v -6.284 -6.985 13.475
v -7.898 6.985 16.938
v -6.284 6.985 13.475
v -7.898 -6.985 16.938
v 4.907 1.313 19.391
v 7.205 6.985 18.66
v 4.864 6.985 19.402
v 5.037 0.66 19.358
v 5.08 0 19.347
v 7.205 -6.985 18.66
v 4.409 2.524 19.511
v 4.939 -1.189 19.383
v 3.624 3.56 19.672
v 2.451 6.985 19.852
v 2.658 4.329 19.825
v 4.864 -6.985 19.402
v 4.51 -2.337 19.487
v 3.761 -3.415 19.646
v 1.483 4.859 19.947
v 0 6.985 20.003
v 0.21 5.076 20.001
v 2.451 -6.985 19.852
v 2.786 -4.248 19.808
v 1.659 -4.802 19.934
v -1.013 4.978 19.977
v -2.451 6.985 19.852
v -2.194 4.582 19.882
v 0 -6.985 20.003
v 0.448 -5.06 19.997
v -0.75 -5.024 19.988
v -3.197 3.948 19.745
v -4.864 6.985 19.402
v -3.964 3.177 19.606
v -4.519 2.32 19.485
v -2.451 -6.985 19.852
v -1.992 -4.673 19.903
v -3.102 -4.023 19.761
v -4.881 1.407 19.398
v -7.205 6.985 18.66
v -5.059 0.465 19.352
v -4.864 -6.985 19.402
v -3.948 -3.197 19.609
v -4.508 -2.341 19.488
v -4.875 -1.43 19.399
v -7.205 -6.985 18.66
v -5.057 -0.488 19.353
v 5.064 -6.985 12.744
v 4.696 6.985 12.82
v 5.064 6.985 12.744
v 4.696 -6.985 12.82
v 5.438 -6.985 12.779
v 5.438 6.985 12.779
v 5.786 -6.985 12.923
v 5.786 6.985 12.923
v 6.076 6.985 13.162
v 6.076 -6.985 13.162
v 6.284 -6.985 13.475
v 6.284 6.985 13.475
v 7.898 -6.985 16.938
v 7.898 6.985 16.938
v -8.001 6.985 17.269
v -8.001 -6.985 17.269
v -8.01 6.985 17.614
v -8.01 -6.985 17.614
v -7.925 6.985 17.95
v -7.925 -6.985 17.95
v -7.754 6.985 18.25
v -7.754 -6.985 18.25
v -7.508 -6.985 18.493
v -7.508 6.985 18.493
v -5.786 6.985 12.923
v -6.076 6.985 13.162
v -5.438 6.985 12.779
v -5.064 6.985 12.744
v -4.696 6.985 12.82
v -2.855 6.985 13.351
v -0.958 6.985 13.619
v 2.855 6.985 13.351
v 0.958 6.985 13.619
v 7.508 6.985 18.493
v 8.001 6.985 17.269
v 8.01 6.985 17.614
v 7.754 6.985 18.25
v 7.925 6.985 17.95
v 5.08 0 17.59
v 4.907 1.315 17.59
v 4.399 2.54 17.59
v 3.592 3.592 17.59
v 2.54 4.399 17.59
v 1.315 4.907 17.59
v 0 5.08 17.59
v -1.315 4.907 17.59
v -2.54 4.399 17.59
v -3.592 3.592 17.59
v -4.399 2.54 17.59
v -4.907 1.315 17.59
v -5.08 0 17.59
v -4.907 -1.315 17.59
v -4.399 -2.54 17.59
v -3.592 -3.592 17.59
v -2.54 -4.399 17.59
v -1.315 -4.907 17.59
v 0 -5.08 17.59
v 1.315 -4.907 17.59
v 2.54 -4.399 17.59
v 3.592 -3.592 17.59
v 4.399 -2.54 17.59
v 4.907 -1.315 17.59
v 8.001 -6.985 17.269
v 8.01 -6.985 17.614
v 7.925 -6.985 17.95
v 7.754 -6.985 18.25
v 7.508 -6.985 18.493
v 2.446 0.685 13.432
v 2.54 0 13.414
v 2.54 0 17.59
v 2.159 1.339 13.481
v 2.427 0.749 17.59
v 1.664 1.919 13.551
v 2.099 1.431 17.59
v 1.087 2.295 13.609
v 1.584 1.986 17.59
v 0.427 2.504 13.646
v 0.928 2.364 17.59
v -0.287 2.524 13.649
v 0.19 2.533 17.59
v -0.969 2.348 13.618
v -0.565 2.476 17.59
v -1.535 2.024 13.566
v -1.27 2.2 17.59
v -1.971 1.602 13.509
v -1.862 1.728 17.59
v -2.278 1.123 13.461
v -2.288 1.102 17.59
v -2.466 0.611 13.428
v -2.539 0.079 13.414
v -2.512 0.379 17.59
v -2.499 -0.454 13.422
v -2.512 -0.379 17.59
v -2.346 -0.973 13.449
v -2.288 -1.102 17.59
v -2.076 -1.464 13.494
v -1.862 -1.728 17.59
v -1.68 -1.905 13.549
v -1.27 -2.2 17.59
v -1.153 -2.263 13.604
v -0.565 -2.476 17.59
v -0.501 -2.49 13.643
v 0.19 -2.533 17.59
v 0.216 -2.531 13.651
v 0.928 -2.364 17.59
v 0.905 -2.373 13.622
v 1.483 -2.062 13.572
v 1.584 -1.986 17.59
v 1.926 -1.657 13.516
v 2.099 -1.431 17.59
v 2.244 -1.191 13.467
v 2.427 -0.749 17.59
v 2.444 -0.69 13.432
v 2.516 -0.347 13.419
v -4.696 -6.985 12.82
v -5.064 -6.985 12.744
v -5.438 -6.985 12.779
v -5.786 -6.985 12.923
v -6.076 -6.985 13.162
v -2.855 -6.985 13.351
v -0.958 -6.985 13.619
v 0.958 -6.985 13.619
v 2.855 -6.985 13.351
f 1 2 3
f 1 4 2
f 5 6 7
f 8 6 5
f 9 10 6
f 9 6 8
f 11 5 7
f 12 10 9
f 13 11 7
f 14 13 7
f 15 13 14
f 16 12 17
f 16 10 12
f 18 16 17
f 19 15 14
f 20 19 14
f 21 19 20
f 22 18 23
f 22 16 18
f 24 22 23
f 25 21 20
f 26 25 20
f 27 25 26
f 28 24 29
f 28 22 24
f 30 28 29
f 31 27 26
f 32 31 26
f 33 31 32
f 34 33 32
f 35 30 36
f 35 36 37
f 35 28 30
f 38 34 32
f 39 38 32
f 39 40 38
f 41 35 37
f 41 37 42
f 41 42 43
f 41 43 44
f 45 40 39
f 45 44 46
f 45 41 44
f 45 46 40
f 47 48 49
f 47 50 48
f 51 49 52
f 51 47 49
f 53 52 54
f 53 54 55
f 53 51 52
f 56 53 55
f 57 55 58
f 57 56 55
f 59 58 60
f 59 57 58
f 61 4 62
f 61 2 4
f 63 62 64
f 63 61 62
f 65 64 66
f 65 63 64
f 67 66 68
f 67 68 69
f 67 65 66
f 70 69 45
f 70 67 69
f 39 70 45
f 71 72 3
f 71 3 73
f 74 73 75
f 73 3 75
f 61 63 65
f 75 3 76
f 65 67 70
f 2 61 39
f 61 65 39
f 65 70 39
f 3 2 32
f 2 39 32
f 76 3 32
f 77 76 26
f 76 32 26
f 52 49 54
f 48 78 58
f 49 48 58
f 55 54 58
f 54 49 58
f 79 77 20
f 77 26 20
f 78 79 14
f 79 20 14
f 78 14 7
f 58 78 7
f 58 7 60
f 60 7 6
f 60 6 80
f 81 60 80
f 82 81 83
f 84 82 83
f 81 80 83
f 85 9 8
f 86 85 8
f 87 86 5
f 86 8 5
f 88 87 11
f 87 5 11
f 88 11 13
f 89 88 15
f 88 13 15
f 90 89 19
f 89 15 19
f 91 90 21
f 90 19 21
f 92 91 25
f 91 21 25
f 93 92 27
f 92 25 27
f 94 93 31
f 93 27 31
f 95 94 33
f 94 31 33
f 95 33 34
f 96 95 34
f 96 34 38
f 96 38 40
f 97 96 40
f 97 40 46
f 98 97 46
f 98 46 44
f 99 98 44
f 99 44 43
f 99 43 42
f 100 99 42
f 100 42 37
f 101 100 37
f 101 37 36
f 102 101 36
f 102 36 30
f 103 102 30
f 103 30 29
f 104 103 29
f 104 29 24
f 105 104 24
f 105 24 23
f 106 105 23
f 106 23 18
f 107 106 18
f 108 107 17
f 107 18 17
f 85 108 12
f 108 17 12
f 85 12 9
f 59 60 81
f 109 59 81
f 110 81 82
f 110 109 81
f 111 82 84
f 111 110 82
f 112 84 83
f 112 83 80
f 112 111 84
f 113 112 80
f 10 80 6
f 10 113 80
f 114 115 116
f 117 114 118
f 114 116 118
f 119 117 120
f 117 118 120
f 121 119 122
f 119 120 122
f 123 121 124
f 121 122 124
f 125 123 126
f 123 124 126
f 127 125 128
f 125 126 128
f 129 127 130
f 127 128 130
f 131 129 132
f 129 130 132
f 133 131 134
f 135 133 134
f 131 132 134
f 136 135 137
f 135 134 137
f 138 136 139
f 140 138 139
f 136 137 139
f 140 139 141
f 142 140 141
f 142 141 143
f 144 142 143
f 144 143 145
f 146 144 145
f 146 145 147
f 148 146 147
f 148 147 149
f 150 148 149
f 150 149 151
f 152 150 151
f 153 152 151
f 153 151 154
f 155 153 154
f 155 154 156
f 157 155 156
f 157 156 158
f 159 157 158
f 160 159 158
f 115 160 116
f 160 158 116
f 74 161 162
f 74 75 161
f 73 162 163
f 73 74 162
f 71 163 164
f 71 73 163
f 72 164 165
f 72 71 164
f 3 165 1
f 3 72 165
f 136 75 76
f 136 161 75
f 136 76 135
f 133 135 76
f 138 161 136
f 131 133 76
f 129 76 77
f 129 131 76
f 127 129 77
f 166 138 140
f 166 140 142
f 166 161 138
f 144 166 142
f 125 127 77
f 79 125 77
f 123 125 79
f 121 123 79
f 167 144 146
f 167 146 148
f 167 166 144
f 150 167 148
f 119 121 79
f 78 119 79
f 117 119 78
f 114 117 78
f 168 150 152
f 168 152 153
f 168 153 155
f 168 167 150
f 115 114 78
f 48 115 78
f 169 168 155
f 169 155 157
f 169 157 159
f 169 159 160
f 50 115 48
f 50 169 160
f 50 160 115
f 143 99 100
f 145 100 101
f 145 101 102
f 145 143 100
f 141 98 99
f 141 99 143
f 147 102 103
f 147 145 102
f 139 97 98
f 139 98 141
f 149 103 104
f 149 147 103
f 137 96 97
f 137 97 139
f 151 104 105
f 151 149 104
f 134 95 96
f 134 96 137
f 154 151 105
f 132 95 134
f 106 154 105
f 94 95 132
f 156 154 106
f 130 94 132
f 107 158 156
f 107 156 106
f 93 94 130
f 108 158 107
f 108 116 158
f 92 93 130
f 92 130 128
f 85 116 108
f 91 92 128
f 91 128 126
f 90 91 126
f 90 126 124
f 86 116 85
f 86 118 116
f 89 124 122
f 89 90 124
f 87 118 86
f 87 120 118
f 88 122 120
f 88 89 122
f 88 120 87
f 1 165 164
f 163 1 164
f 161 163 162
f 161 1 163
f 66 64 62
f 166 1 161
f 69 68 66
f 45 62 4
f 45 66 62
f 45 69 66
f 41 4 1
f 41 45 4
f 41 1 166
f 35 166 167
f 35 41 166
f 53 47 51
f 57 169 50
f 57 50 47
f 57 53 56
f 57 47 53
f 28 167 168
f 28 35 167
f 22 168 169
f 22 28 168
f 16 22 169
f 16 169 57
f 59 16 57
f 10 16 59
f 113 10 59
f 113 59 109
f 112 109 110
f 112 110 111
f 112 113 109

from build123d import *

# Parameters (mm, degrees)
F1_DEPTH = 6.985
F4_R     = 5.08
F5_DEPTH = 2.413
F6_R     = 2.54
F7_DEPTH = 5.2171329375
F8_R     = 1.27


with BuildPart() as f1:
    # F0 (on Front) → F1 (new body, symmetric)
    with BuildSketch(Plane.XZ):
        with BuildLine():
            ThreePointArc((-5.7697958184, 12.3733670625), (0, 13.6525), (5.7697958184, 12.3733670625))
            Line((5.7697958184, 12.3733670625), (8.4534217805, 18.1284215102))
            ThreePointArc((8.4534217805, 18.1284215102), (0, 20.0025), (-8.4534217805, 18.1284215102))
            Line((-8.4534217805, 18.1284215102), (-5.7697958184, 12.3733670625))
        make_face()
    extrude(amount=F1_DEPTH, both=True)

    # F4 (on plane+point) → F5 (cut)
    with BuildSketch(Plane.XY.offset(20.0025)):
        Circle(F4_R)
    extrude(amount=-F5_DEPTH, mode=Mode.SUBTRACT)

    # F6 (on face) → F7 (cut, through all)
    with BuildSketch(Plane.XY.offset(17.5895)):
        Circle(F6_R)
    extrude(amount=-F7_DEPTH, mode=Mode.SUBTRACT)

    # F8
    f8_edges = [f1.edges().sort_by_distance(p)[0] for p in [
        (8.453422, 0, 18.128422),
        (-8.453422, 0, 18.128422),
        (5.769796, 0, 12.373367),
        (-5.769796, 0, 12.373367),
    ]]
    fillet(f8_edges, radius=F8_R)


solid = f1.part
